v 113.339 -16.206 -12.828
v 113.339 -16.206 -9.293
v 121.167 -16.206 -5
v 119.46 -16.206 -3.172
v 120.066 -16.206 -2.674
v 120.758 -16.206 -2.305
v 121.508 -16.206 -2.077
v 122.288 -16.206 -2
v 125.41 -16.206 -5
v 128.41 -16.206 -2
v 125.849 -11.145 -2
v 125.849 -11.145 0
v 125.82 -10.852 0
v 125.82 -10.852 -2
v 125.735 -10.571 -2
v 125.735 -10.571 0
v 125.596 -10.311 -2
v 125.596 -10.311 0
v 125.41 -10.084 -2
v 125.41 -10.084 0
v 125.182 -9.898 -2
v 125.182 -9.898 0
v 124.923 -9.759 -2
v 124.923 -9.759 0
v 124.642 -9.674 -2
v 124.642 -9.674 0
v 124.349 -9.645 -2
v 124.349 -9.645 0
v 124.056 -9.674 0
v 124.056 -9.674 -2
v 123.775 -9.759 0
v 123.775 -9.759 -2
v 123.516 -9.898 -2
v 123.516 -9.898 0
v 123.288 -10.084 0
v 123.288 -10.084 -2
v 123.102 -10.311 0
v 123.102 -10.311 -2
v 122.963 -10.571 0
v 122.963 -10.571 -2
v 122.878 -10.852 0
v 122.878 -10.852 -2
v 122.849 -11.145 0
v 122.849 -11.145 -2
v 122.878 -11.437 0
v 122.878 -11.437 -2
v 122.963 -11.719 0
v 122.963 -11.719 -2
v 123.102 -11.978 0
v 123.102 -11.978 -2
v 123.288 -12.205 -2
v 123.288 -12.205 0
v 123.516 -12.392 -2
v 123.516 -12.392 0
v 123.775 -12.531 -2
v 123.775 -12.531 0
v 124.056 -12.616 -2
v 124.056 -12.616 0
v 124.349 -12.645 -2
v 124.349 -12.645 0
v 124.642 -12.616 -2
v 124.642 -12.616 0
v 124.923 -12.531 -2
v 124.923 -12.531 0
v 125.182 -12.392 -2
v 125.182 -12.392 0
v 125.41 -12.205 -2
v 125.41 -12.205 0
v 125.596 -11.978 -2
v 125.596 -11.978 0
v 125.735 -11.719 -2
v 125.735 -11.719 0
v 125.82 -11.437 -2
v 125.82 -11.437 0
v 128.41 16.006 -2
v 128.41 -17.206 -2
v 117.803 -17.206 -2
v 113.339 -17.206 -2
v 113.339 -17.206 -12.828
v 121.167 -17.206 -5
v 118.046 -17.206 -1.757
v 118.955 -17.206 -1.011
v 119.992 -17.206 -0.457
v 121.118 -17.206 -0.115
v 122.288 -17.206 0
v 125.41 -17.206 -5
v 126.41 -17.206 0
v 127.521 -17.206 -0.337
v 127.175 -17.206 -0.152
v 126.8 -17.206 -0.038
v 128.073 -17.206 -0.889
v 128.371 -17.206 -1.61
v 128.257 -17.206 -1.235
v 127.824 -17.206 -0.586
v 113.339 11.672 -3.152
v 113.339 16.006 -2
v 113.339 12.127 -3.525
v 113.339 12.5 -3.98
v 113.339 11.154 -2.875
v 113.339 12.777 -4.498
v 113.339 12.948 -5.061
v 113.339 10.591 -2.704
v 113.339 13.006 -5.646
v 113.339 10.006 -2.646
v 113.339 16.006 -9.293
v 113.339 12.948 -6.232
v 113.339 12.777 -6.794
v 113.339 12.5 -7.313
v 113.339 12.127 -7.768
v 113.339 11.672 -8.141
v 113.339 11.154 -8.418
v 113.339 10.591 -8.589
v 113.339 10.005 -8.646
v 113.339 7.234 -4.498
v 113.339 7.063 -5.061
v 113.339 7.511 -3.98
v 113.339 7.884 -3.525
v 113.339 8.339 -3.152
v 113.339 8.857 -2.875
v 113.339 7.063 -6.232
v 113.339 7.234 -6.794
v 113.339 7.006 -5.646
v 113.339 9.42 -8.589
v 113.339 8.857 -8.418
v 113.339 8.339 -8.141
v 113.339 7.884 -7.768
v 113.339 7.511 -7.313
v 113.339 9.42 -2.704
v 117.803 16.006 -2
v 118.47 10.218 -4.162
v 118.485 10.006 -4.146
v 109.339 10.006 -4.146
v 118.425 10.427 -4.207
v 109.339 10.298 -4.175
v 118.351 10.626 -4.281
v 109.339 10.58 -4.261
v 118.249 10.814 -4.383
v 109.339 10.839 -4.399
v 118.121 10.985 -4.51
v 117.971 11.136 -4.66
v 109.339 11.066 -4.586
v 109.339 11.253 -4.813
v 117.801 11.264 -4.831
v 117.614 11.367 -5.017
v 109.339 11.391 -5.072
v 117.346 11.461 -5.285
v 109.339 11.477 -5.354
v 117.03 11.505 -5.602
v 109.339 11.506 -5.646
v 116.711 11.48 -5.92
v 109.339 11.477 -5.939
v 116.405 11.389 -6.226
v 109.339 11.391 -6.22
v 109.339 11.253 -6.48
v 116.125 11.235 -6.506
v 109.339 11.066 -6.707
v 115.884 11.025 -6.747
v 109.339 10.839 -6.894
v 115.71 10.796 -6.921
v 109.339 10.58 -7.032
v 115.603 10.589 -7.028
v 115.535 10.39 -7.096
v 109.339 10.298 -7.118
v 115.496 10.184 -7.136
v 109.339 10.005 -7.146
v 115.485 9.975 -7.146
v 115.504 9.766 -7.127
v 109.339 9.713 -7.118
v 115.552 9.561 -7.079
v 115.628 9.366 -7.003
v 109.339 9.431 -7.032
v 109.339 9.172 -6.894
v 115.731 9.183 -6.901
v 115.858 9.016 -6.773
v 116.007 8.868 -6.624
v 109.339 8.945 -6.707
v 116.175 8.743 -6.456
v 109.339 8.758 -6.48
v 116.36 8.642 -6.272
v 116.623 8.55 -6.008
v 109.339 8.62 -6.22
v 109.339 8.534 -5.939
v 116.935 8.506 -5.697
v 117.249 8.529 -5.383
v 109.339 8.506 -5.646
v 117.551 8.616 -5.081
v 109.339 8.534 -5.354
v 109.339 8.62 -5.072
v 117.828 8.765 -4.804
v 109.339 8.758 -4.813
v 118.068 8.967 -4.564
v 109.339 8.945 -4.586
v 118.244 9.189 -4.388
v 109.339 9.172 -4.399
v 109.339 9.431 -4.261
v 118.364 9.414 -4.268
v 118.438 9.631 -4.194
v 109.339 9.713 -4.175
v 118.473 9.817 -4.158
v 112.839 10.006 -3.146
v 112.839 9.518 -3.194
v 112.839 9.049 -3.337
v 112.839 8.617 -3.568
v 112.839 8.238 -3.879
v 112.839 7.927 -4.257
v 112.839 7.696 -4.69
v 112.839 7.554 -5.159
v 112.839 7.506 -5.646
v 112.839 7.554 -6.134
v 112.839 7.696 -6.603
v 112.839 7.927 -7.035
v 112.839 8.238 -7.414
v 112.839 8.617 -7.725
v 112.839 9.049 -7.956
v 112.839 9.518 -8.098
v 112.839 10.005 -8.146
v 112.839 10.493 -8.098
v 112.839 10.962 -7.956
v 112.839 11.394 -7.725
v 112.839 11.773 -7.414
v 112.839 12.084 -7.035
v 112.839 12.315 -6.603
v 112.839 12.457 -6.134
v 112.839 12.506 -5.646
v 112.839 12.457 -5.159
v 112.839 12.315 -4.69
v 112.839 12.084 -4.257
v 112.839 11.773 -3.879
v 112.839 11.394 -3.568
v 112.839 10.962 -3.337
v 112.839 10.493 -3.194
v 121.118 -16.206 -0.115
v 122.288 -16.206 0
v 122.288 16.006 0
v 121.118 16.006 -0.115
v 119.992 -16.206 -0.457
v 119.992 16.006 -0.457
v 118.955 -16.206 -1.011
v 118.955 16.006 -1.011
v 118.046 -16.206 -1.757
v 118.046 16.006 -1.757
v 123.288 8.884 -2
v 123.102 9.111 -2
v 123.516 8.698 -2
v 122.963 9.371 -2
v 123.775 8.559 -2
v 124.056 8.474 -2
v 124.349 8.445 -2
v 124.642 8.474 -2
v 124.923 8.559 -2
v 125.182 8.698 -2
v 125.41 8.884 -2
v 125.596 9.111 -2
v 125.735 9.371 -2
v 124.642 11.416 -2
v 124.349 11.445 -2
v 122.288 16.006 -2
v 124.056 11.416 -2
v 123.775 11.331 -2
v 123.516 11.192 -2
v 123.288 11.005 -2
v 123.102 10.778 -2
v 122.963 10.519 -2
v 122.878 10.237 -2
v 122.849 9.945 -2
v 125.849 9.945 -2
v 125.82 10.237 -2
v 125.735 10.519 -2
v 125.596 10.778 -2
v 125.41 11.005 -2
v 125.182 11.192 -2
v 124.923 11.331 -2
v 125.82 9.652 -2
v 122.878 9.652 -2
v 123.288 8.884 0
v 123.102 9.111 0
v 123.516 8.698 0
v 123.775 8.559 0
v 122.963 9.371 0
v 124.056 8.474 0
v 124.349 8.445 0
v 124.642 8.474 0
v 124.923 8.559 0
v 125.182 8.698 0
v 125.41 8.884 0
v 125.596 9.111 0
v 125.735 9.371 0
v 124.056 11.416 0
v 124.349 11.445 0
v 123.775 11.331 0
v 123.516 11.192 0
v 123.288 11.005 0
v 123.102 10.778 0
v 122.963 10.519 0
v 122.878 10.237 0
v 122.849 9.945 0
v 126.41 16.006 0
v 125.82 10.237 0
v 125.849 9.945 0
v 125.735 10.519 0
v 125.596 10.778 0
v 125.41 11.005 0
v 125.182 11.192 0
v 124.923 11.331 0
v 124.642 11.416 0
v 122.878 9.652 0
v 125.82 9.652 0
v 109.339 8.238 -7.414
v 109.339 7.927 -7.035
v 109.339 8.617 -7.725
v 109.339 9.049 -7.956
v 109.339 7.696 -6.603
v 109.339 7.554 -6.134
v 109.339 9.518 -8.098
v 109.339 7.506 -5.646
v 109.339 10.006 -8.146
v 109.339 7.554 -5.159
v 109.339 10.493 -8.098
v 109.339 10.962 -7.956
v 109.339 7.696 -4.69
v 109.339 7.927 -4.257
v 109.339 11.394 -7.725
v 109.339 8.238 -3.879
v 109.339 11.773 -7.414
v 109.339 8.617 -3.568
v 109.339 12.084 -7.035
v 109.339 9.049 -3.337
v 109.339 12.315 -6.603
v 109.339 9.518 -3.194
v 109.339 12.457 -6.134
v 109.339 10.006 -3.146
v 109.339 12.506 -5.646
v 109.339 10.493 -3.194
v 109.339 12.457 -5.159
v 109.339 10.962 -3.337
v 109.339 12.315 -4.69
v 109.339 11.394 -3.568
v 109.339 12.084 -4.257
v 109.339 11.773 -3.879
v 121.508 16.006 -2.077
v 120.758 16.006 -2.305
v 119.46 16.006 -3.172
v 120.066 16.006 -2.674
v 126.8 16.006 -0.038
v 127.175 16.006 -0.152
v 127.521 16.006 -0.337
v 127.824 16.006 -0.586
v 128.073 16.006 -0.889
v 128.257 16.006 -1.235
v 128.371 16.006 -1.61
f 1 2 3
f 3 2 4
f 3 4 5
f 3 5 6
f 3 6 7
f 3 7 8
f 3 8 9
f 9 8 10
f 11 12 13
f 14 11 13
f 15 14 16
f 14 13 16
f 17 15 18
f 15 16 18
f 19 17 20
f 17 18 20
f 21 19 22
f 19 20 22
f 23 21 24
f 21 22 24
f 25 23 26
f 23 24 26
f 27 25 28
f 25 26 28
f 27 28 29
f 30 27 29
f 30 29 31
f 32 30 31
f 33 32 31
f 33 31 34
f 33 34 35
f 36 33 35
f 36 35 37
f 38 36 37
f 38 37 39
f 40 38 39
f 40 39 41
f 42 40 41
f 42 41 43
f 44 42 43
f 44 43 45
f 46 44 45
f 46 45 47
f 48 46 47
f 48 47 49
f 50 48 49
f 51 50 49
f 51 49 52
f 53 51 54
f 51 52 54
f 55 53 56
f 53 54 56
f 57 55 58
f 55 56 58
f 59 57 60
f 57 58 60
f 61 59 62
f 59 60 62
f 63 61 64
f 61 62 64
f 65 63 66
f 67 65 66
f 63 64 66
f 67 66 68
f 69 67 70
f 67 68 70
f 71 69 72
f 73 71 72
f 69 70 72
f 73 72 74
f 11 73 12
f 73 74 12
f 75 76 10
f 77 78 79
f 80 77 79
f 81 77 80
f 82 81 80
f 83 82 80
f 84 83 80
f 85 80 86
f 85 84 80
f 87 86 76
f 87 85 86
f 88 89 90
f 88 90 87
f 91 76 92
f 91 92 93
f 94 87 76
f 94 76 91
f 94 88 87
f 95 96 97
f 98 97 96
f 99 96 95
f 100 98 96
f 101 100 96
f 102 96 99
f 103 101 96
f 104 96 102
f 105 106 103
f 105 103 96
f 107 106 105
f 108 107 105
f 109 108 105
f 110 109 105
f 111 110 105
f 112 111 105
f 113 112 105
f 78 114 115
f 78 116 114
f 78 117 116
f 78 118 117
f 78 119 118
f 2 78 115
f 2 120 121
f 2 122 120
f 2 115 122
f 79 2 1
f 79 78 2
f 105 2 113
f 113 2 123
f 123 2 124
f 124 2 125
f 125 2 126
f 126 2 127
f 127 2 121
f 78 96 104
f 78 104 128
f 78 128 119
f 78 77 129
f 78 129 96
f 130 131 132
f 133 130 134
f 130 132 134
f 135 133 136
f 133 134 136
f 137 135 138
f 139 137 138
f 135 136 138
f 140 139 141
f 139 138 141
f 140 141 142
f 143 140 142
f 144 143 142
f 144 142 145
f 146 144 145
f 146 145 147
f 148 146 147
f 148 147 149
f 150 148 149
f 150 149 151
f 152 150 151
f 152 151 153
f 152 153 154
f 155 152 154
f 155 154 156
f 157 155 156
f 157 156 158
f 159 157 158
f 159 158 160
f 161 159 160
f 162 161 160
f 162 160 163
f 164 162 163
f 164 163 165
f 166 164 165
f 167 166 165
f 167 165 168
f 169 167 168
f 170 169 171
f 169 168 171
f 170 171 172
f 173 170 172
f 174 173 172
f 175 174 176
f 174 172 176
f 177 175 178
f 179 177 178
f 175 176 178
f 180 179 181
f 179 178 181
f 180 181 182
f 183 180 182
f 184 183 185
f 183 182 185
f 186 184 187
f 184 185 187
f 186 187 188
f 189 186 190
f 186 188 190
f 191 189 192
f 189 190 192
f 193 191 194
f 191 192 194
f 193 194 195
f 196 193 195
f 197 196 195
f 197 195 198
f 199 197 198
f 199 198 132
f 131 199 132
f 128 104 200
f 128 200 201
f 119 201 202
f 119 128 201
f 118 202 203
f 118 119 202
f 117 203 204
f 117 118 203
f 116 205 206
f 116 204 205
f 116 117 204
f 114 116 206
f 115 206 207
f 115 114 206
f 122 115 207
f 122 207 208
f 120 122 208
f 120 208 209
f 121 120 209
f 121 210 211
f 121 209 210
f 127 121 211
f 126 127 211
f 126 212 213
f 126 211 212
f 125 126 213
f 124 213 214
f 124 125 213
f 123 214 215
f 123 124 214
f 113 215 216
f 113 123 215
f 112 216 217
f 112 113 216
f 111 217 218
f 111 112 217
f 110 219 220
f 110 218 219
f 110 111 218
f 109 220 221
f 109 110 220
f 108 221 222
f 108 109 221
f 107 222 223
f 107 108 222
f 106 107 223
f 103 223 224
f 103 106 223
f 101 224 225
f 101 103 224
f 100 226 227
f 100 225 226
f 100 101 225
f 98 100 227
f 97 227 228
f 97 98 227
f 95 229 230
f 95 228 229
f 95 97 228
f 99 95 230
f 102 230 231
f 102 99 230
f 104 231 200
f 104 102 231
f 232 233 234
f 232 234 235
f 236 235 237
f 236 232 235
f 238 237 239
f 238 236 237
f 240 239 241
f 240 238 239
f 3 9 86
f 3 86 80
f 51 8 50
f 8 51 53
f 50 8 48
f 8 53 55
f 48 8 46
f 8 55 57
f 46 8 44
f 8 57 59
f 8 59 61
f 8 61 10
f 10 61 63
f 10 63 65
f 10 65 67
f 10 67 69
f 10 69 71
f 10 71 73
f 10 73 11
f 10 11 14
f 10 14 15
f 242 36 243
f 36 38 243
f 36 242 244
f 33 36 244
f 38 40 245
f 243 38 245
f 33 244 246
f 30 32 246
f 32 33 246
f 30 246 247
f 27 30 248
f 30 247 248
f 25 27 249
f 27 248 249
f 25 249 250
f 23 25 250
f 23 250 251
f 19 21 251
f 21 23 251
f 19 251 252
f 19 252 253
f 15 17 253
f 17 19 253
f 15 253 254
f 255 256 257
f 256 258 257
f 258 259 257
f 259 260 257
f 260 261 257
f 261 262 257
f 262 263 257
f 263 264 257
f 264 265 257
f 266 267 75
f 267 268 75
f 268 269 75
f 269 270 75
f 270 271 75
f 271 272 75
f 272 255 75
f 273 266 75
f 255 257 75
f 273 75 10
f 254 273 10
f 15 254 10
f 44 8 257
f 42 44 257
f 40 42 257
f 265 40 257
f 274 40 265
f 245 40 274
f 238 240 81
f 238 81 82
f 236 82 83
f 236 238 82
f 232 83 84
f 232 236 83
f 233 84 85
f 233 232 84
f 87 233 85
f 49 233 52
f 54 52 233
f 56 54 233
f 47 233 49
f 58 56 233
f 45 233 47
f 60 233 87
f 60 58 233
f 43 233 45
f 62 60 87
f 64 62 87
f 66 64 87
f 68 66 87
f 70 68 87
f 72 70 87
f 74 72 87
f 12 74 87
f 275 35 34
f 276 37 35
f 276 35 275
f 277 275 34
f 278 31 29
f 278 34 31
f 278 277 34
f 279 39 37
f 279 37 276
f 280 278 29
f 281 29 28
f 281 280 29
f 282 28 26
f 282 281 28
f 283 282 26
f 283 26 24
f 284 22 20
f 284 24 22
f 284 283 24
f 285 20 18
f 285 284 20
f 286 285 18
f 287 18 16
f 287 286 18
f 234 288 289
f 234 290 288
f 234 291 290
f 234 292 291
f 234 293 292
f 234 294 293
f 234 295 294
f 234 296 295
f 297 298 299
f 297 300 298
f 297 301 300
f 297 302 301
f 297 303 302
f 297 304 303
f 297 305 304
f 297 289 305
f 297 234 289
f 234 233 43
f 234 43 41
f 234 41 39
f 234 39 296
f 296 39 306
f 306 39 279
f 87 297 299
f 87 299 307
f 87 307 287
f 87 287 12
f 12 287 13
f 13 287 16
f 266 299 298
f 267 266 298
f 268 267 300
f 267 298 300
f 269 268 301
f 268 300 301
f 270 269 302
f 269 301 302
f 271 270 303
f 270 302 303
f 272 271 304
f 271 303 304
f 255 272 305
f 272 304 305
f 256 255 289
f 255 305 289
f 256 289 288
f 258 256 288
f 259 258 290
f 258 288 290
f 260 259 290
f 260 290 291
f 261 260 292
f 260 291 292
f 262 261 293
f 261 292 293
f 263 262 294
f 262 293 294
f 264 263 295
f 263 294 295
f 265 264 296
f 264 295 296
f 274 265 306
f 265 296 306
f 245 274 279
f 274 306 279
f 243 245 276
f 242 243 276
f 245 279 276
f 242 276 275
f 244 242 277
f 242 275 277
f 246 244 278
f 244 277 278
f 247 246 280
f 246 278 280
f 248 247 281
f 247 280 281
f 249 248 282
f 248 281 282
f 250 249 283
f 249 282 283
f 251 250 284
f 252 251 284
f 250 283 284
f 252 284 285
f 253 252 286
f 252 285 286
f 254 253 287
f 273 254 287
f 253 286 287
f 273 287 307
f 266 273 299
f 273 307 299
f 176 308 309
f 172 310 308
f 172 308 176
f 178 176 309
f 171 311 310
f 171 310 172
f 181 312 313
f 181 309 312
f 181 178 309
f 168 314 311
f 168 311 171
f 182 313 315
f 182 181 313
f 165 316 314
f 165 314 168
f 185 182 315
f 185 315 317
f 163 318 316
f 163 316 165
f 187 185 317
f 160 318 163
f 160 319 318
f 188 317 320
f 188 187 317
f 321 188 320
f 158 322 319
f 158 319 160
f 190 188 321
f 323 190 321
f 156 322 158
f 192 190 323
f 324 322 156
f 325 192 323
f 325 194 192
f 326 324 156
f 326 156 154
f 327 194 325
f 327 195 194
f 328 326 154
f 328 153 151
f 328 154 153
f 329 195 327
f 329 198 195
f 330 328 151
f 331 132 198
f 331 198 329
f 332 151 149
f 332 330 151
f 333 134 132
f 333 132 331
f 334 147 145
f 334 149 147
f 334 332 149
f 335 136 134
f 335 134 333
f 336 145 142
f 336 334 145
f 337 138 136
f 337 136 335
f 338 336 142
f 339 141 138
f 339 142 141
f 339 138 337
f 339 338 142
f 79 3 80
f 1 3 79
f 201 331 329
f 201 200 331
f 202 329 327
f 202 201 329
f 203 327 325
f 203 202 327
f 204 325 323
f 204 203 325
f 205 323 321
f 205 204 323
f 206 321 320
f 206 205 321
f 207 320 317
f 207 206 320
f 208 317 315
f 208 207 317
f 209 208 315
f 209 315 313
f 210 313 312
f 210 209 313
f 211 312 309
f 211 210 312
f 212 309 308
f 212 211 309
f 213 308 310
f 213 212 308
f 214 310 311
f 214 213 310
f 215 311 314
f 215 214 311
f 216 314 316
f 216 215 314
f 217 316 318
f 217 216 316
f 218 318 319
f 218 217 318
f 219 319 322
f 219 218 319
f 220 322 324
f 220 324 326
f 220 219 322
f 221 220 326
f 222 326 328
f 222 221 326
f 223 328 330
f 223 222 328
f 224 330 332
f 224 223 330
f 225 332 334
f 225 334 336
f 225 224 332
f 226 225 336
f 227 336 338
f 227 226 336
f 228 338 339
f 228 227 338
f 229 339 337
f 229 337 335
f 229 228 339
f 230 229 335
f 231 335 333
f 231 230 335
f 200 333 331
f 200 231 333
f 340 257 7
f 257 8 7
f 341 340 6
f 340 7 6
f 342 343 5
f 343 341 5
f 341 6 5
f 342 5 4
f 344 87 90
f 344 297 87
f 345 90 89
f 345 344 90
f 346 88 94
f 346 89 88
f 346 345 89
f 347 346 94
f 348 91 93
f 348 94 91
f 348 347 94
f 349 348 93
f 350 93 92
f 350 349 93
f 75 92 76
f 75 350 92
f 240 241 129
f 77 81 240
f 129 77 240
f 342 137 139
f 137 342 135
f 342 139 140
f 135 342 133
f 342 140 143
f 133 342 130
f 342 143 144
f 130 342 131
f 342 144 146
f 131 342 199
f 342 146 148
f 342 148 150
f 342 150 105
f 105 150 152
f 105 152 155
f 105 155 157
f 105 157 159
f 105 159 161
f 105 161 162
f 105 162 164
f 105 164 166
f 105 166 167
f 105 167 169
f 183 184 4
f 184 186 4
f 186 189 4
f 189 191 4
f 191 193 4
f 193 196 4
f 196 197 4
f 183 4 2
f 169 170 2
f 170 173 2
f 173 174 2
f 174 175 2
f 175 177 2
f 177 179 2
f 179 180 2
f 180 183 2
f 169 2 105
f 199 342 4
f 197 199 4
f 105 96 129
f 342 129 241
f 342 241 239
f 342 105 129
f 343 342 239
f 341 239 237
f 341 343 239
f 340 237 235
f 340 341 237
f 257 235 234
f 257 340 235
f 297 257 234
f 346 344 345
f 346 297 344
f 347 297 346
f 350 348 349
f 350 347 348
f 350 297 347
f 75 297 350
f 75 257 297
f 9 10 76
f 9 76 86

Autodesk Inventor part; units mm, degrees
ref_plane "YZ Plane" through (0, 0, 0) normal (1, 0, 0) x (0, 1, 0)
sketch "Sketch1" plane through (0, 0, 0) normal (0, 0, 1) x (1, 0, 0)
  line L0 (122.2883, -16.0055) -> (122.2883, 46.9321) projected
  line L1 (122.2883, -16.0055) -> (128.4096, -16.0055) projected
  line L2 (128.4096, -16.0055) -> (128.4096, 44.4321) projected
  line L3 (136.1877, 44.4321) -> (128.4096, 44.4321) projected
  line L4 (136.1877, 46.9321) -> (136.1877, 44.4321) projected
  line L5 (122.2883, 46.9321) -> (136.1877, 46.9321) projected
  line L6 (3.0607, 16.0055) -> (-1.0607, 16.0055) projected
  line L7 (122.2883, 16.0055) -> (128.4096, 16.0055)
  point P0 (0, 0)
extrude "Extrusion1" add sketch "Sketch1" against normal blind 2 contours L0 L7 L2 L1
sketch "Sketch2" plane through (122.2883, -16.0055, 0) normal (0, -1, 0) x (1, 0, 0)
  line L0 (0, 0) -> (6.1213, 0) projected
  line L1 (0, 0) -> (0, -2) projected
  line L2 (6.1213, -2) -> (0, -2) projected
  line L3 (6.1213, 0) -> (6.1213, -2) projected
  point P0 (-122.2883, 0)
ref_plane "Work Plane1" through (-3.0607, -16.2055, -14.9496) normal (0, 1, 0) x (0.7071068, 0, 0.7071068)
extrude "Extrusion2" add sketch "Sketch2" along normal up to surface (0.2 mm away)
ref_plane "Work Plane2" through (-3.4749, -17.2055, -14.9496) normal (0, -1, 0) x (0.7071068, 0, -0.7071068)
sketch "Sketch3" plane through (122.2883, -16.2055, -2) normal (0, -1, 0) x (1, 0, 0)
  line L0 (0, 2) -> (0, 0)
  line L1 (0, 0) -> (6.1213, 0)
  line L2 (6.1213, 0) -> (6.1213, 2)
  line L3 (6.1213, 2) -> (0, 2)
  arc A0 (-123.3489, 2) -> (-125.3489, 0) centre (-123.3489, 0) ccw
  line L4 (-125.3489, 0) -> (-122.3489, -3)
  line L5 (-122.3489, -3) -> (-118.1063, -3)
  line L6 (-118.1063, -3) -> (-110.278, -10.8283)
  line L7 (-110.278, -10.8283) -> (-110.278, 0)
  line L8 (-110.278, 0) -> (-114.7423, 0)
  line L9 (-114.7423, 0) -> (-114.9849, 0.2426)
  arc A1 (-114.9849, 0.2426) -> (-119.2276, 2) centre (-119.2276, -4) ccw
  line L10 (-119.2276, 2) -> (-123.3489, 2)
  line L11 (-110.278, -10.8283) -> (8.4603, -10.8283)
  line L12 (-110.278, -10.8283) -> (8.4603, -10.8283) construction
  arc A2 (0, 0) -> (-2.8284, -1.1716) centre (0, -4) ccw
  line L13 (-54.1499, -52.493) -> (-2.8284, -1.1716)
  line L14 (-12.4852, -10.8283) -> (-1.6569, -10.8283) construction
  arc A3 (0, 2) -> (-4.2426, 0.2426) centre (0, -4) ccw
  line L15 (-1.1213, -3) -> (-18.8648, -20.7435)
  line L16 (3.1213, -3) -> (-1.1213, -3)
  line L17 (6.1213, 0) -> (3.1213, -3)
  line L18 (-8.9496, -10.8283) -> (81.0504, -10.8283) construction
  line L19 (-8.9496, -10.8283) -> (-8.9496, 0)
  line L20 (-8.9496, -10.8283) -> (1.8787, -10.8283) construction
  line L21 (-8.9496, 0) -> (-4.4853, 0)
  line L22 (-55.5641, -51.0788) -> (-8.9496, -4.4643)
  line L23 (-4.4853, 0) -> (-4.2426, 0.2426)
  point P0 (-122.2883, 2)
extrude "Extrusion3" add sketch "Sketch3" along normal up to surface (1 mm away) contours L3 L2 L1 L0 | L0 A2 L13 L19 L21 L23 A3 | L1 L17 L16 L15 L19 L13 A2
sketch "Sketch4" plane through (122.2883, -16.2055, -2) normal (0, 1, 0) x (1, 0, 0)
  line L0 (-2.8284, 1.1716) -> (-33.605, 31.9482) projected
  arc A0 (-2.8284, 1.1716) -> (0, 0) centre (0, 4) ccw projected
  line L1 (0, -2) -> (0, 0) projected
  arc A1 (-4.2426, -0.2426) -> (0, -2) centre (0, 4) ccw projected
  line L2 (-4.2426, -0.2426) -> (-4.4853, 0) projected
  line L3 (-4.4853, 0) -> (-8.9496, 0) projected
  line L4 (-8.9496, 0) -> (-8.9496, 10.8283) projected
  point P0 (-122.2883, -2)
  point P1 (-8.9496, 7.2928)
extrude "Extrusion4" add sketch "Sketch4" along normal up to surface (32.211 mm away)
fillet "Fillet1" radius 2 1 edges at (128.4096, -0.6, 0)
sketch "Sketch6" plane through (113.3386, -17.2055, -2) normal (-1, 0, 0) x (0, 0, 1)
  circle A0 centre (6.5566, 27.211) radius 35
  line L0 (-7.2928, 1) -> (-7.2928, 33.211) projected
  line L1 (-10.8283, 0) -> (0, 0) projected
  line L2 (0, 33.211) -> (0, 0) projected
  line L3 (0, 33.211) -> (-7.2928, 33.211) projected
  line L4 (-7.2928, 1) -> (-7.2928, 33.211) projected
  line L5 (-7.2928, 1) -> (-10.8283, 1) projected
  line L6 (-10.8283, 1) -> (-10.8283, 0) projected
  line L7 (0, 27.211) -> (-7.2928, 27.211)
  circle A1 centre (-3.6464, 27.211) radius 2.5
  point P0 (2, 17.2055)
  dimension "d16" = 5
extrude "Extrusion5" add sketch "Sketch6" along normal blind 4 contours A1 L7 | L7 A1
chamfer "Chamfer1" distance 0.5 angle 45 1 edges at (113.3386, 10.0055, -8.1464)
sketch "Sketch7" plane through (109.3386, 10.0055, -5.6464) normal (-1, 0, 0) x (0, 0, 1)
  circle A0 centre (0, 0) radius 2.5 projected
  circle A1 centre (0, 0) radius 1.5
  point P0 (5.6464, -10.0055)
  dimension "d22" = 3
extrude "Extrusion6" cut sketch "Sketch7" against normal through all contours A1
sketch "Sketch8" plane through (0, 0, 0) normal (0, 0, 1) x (1, 0, 0)
  line L0 (126.4096, 16.0055) -> (126.4096, -17.2055) projected
  line L1 (126.4096, 16.0055) -> (122.2883, 16.0055) projected
  line L2 (122.2883, 16.0055) -> (122.2883, -17.2055) projected
  line L3 (122.2883, -17.2055) -> (126.4096, -17.2055) projected
  line L4 (122.2883, 16.0055) -> (119.4598, 16.0055) projected
  line L5 (122.2883, 16.0055) -> (126.4096, 16.0055)
  line L6 (126.4096, 16.0055) -> (126.4096, 12.0055)
  line L7 (126.4096, 12.0055) -> (122.2883, 12.0055)
  line L8 (122.2883, 12.0055) -> (122.2883, 16.0055)
  line L9 (122.2883, -17.2055) -> (126.4096, -17.2055)
  line L10 (126.4096, -17.2055) -> (126.4096, -13.2055)
  line L11 (126.4096, -13.2055) -> (122.2883, -13.2055)
  line L12 (122.2883, -13.2055) -> (122.2883, -17.2055)
  circle A0 centre (124.3489, 9.9448) radius 2.0607
  circle A1 centre (124.3489, -11.1448) radius 2.0607
  circle A2 centre (124.3489, 9.9448) radius 1.5
  circle A3 centre (124.3489, -11.1448) radius 1.5
  point P0 (0, 0)
  dimension "d25" = 4
  dimension "d26" = 4
  dimension "d27" = 3
  dimension "d28" = 3
extrude "Extrusion7" cut sketch "Sketch8" against normal blind 10 contours A2 | A3
properties part number "GripperHandleLeft_3DPrint"
